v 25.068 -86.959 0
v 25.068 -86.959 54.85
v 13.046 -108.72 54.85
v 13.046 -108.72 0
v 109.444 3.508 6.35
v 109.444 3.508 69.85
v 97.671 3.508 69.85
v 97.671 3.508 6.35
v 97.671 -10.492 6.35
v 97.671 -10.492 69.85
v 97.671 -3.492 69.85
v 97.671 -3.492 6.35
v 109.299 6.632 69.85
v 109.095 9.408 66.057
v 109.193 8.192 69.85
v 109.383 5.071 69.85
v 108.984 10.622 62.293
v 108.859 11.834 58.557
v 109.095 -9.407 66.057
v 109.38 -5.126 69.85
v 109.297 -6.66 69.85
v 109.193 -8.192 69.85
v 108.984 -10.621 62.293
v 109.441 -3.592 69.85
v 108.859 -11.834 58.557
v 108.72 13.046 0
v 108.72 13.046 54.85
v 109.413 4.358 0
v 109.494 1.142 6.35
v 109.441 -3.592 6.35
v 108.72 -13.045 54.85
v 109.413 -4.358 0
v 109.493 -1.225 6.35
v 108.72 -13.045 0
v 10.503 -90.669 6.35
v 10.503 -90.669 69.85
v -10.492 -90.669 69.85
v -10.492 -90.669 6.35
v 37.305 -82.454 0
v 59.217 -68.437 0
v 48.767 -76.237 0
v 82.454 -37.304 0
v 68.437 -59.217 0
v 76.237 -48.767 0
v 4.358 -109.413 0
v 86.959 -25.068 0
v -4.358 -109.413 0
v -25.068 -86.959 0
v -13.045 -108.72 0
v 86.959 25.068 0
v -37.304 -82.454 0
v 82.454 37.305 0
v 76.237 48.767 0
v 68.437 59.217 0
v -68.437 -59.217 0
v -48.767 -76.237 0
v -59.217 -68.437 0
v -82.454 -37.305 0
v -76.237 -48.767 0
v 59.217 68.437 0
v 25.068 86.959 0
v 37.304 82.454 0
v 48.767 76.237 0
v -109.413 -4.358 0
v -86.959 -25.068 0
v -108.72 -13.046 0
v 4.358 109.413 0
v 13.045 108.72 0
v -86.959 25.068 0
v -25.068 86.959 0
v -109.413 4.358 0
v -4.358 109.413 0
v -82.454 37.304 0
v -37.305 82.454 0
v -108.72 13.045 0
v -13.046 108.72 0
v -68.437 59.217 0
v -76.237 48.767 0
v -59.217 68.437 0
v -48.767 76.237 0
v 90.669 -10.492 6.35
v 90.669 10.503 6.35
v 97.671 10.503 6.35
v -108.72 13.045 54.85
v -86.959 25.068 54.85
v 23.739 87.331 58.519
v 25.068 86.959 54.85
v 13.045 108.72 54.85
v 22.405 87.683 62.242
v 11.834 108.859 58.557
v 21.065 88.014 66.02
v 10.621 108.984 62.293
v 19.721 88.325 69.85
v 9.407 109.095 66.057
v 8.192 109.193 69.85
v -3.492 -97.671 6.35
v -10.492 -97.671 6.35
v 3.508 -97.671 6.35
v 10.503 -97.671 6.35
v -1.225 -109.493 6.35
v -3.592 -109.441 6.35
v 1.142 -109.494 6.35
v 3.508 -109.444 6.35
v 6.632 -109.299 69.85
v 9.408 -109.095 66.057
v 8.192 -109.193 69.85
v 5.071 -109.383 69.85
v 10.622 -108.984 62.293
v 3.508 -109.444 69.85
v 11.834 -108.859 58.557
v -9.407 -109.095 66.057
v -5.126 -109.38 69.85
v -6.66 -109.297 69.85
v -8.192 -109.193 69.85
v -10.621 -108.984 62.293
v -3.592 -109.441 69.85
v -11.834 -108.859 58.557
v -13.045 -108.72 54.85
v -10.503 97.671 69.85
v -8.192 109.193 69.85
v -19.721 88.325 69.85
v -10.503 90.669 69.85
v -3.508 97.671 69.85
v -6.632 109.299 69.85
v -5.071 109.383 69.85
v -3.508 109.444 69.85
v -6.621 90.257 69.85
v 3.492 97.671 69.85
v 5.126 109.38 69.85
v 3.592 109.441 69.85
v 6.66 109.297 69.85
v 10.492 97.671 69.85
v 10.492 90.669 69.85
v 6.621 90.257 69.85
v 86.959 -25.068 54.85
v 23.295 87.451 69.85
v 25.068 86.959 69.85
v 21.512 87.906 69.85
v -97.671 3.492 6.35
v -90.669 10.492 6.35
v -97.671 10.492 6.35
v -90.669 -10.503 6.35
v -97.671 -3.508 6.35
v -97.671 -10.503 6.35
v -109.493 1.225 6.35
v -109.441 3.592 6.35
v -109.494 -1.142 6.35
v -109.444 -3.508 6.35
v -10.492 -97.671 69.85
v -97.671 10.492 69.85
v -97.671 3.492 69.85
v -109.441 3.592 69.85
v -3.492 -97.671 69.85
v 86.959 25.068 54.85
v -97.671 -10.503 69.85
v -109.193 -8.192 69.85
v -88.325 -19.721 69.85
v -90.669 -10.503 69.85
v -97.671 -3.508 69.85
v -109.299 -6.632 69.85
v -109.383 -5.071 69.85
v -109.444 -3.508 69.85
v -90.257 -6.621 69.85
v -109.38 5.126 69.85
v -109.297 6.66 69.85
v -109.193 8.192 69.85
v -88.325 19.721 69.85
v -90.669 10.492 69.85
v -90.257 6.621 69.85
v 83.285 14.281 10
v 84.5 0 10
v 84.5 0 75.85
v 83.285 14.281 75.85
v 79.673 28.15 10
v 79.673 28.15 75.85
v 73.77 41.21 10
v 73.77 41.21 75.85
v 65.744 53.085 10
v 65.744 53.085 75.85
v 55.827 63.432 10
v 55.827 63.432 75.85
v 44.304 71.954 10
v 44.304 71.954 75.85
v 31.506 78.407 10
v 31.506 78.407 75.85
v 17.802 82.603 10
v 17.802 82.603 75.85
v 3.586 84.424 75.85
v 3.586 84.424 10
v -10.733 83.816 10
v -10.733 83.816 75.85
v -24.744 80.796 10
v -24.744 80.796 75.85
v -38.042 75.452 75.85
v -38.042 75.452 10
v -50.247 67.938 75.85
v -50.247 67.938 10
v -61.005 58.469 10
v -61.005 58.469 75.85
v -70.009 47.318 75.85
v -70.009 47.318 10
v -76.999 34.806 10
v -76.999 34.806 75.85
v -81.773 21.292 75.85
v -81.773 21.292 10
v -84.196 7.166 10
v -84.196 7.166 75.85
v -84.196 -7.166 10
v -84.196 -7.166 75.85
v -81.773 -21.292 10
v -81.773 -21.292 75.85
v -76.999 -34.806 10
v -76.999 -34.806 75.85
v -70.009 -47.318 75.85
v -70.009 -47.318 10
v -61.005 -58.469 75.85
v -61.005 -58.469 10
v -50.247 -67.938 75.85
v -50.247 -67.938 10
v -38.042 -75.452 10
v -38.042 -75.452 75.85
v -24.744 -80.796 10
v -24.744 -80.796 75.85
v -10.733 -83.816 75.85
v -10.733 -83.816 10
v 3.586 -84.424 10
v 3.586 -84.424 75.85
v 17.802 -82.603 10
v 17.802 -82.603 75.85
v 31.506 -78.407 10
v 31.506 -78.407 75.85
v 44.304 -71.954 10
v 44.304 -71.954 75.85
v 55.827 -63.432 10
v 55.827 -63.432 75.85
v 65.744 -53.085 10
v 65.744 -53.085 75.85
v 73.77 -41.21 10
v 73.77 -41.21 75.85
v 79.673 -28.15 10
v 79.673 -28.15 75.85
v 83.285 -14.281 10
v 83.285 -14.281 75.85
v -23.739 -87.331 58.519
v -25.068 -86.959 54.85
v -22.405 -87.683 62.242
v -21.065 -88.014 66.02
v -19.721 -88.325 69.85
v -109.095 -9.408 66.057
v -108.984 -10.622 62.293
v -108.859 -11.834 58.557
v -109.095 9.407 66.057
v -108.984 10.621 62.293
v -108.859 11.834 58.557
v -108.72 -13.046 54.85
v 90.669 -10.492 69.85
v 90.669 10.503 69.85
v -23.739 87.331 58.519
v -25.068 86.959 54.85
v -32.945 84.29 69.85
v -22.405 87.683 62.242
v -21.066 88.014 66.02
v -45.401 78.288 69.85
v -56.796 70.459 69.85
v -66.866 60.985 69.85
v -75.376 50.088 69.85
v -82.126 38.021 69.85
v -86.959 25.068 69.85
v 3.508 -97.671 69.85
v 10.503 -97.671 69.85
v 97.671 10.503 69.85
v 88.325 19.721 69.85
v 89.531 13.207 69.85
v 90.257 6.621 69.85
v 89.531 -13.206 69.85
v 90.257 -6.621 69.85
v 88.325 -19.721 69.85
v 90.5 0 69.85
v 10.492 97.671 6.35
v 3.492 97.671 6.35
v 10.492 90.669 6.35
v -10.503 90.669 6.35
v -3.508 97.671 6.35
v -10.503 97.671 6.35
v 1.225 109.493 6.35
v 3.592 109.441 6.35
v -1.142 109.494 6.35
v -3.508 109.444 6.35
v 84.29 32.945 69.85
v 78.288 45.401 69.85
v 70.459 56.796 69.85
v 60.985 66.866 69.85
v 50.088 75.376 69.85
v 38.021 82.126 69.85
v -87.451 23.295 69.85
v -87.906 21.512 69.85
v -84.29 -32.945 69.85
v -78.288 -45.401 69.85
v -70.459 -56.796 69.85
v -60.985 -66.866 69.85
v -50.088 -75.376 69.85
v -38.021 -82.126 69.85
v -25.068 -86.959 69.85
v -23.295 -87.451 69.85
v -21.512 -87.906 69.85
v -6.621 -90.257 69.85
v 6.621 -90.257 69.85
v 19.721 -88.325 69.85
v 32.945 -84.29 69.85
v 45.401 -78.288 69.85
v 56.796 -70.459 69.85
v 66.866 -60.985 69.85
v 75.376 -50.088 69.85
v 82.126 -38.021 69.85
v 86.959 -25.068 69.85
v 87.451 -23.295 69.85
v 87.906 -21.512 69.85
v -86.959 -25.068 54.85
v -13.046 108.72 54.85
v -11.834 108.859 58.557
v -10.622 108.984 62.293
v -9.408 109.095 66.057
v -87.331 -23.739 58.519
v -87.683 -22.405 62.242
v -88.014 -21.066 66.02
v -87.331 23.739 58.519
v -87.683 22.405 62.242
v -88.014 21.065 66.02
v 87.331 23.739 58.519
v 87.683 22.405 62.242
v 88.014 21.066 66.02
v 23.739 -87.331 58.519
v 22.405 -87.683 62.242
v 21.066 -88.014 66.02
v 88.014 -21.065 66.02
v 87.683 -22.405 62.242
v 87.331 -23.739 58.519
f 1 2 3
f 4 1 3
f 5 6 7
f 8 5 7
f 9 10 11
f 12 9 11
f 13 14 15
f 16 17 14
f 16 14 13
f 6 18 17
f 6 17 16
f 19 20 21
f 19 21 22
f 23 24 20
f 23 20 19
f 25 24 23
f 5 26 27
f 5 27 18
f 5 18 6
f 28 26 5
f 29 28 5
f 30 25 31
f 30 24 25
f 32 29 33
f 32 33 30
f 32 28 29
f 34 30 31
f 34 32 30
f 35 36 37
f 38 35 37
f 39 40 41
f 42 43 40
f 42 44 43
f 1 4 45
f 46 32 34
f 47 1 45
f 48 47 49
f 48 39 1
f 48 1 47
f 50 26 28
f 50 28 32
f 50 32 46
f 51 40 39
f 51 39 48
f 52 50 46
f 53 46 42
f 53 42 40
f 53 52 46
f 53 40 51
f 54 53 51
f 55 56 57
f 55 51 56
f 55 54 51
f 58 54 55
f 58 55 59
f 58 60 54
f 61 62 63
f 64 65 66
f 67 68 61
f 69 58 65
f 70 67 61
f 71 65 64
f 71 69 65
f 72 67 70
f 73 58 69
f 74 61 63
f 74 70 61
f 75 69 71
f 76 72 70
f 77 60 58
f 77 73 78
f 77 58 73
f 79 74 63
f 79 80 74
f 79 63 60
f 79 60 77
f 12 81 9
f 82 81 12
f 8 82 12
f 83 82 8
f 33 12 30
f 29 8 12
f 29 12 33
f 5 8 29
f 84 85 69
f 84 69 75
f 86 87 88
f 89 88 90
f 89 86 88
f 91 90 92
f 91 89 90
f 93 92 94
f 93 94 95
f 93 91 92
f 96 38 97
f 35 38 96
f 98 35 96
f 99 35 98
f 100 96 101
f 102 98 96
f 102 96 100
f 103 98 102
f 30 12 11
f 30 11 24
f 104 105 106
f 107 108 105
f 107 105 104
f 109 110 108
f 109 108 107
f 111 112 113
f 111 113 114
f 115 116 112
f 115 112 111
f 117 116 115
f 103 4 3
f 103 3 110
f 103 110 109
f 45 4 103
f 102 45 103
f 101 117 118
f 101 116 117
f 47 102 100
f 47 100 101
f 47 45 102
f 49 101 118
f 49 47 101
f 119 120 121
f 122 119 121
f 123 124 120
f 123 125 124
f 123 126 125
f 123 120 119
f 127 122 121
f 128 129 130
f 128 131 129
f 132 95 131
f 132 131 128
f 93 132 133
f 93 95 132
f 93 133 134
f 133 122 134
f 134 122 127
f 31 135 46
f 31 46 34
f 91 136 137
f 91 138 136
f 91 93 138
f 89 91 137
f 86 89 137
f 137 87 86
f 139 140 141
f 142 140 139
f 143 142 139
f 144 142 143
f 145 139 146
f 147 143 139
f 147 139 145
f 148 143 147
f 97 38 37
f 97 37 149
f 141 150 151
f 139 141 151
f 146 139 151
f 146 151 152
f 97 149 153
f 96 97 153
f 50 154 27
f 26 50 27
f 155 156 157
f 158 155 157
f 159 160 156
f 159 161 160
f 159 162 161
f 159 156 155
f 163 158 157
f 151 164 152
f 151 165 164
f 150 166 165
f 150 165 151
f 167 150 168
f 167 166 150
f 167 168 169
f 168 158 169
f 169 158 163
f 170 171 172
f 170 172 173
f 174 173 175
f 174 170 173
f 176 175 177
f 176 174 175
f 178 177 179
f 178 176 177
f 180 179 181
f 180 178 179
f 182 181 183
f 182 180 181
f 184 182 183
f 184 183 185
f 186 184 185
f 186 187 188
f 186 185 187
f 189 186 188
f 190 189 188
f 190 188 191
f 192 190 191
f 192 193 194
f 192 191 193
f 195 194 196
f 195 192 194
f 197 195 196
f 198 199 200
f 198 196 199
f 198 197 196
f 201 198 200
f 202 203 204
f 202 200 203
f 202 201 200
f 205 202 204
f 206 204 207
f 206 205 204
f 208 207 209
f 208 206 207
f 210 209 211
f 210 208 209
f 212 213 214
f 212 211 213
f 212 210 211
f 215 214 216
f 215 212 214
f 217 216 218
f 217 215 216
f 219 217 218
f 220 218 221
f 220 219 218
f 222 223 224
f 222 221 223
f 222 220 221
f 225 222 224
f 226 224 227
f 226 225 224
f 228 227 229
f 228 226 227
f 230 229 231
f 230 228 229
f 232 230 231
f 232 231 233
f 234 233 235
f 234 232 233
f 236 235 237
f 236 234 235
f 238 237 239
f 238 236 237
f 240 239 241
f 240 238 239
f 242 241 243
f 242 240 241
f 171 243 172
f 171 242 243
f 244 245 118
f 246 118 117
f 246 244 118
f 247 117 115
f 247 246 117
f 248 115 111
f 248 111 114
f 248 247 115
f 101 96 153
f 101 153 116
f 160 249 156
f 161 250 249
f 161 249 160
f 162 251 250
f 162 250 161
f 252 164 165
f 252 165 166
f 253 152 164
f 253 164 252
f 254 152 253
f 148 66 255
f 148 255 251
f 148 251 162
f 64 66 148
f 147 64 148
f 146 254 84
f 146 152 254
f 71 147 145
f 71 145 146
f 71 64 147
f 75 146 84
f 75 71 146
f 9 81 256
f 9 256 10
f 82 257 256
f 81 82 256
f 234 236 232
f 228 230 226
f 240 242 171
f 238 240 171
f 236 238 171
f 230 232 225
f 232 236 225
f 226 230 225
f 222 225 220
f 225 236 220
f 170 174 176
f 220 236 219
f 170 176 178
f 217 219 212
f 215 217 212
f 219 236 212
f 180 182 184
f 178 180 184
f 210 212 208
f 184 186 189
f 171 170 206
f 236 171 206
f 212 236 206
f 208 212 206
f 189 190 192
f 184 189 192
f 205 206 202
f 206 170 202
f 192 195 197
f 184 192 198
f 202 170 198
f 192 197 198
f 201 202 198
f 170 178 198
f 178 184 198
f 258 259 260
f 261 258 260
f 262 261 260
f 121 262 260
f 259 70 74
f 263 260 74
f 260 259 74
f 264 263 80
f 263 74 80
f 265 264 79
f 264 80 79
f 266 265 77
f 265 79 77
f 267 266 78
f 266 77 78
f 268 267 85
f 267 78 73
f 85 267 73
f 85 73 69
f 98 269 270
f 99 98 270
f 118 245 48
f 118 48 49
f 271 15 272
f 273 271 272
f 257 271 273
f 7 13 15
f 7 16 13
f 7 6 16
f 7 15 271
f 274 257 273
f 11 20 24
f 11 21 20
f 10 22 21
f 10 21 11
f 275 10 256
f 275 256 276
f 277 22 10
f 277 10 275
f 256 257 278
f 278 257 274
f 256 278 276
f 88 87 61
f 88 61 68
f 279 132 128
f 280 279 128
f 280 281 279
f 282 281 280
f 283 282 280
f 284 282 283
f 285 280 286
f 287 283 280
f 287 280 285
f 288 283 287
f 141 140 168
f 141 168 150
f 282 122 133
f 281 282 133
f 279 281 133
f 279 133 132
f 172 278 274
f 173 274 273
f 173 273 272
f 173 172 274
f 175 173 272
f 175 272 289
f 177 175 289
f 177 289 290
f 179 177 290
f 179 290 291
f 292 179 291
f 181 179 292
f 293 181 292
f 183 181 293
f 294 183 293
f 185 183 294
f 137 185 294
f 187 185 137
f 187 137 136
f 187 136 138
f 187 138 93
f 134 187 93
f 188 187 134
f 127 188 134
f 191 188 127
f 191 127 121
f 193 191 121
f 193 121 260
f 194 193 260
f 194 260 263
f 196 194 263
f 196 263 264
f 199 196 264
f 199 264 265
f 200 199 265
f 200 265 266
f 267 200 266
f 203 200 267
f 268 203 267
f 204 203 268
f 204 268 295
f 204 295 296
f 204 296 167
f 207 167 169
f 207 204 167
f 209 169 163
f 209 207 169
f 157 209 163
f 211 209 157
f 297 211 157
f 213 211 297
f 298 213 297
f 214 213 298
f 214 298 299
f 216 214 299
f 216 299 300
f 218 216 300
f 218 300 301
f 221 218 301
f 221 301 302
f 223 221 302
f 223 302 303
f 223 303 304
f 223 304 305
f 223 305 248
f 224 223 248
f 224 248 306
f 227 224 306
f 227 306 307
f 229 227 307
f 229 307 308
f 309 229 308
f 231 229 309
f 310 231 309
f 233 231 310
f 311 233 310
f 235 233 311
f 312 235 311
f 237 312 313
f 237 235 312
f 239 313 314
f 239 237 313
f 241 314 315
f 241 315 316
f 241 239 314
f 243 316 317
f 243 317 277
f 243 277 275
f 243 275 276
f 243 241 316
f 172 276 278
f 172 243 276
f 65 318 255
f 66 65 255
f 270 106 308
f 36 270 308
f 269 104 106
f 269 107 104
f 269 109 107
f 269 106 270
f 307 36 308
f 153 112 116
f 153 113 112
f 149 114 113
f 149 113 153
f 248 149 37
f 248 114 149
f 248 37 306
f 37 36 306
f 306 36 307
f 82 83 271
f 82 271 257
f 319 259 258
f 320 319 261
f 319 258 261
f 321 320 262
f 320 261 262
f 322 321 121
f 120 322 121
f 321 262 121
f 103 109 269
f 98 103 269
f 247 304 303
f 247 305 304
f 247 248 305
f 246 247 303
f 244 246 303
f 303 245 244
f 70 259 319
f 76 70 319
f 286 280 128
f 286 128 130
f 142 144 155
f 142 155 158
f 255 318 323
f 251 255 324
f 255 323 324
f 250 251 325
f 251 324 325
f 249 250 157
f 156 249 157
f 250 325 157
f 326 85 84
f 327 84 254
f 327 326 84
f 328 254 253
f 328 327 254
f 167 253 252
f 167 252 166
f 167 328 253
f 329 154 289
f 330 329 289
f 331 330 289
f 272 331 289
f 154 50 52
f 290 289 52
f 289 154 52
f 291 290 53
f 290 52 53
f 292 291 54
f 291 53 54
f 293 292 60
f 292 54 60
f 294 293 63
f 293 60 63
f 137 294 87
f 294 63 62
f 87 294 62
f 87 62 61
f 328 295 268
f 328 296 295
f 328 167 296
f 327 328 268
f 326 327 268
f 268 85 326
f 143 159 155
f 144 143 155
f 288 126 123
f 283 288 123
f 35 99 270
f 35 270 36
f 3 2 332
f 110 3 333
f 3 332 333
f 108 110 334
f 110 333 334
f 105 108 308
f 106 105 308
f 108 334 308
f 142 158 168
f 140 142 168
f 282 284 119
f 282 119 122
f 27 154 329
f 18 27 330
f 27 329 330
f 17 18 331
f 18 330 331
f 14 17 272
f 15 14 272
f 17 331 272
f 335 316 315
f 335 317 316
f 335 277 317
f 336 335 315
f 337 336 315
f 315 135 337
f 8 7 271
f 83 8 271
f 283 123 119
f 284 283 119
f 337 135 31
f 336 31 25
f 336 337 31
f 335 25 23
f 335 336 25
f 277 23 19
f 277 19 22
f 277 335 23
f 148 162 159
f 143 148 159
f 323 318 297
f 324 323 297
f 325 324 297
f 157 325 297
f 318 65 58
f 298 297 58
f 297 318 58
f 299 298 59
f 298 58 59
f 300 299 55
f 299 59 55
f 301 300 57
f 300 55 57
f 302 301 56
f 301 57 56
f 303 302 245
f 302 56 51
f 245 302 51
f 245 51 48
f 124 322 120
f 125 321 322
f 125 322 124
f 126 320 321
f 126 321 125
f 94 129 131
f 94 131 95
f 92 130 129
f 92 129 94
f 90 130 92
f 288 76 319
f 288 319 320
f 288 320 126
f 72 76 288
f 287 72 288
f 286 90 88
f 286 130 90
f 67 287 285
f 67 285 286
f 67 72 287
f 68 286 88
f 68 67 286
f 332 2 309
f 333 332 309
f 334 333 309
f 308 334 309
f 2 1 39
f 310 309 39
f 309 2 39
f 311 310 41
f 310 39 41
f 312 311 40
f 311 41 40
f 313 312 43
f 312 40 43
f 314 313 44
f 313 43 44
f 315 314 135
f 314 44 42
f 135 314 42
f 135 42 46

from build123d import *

# Parameters (mm, degrees)
SKETCH1_R           = 90.5
SKETCH1_R_2         = 84.5
BOSS_EXTRUDE1_DEPTH = 76.35
CHAMFER1_SIZE       = 6.5
WRAP12_SECTION_W    = 19
WRAP12_SECTION_H    = 69.85
WRAP12_ANGLE        = 32.161608832
CUT_EXTRUDE1_DEPTH  = 63.5
CHAMFER2_SIZE       = 19
CHAMFER5_SIZE       = 15
CHAMFER5_SIZE_2     = 4.019237886
CIRPATTERN6_COUNT   = 4
SKETCH15_R          = 84.5
BOSS_EXTRUDE2_DEPTH = 10


with BuildPart() as part:
    # Sketch1 → Boss-Extrude1 (new body)
    with BuildSketch(Plane.XY):
        Circle(SKETCH1_R)
        Circle(SKETCH1_R_2, mode=Mode.SUBTRACT)
    extrude(amount=BOSS_EXTRUDE1_DEPTH)

    # Chamfer1
    # the kernel refuses this chamfer: 6.5 mm, written as the material it takes off along each edge
    with BuildSketch(Plane(origin=(0, 0, 76.35), x_dir=(1, 0, 0), z_dir=(0, -1, 0))) as chamfer1_piece_1:
        Polygon((90.5, -CHAMFER1_SIZE), (90.5 - CHAMFER1_SIZE, 0), (90.5, 0), align=None)
    revolve(axis=Axis((0, 0, 76.35), (0, 0, 1)), mode=Mode.SUBTRACT)

    # Wrap12 section (on wrap section) → Wrap12 (revolve)
    with BuildSketch(Plane(origin=(0, 0, 0), x_dir=(0.9608717281441653, 0.276993722046629, 0), z_dir=(-0.276993722046629, 0.9608717281441653, 0))):
        with Locations((100, -34.925)):
            Rectangle(WRAP12_SECTION_W, WRAP12_SECTION_H)
    revolve(axis=Axis((0, 0, 0), (0, 0, -1)), revolution_arc=WRAP12_ANGLE)

    # Sketch12 → Cut-Extrude1 (cut)
    with BuildSketch(Plane.XY.offset(69.85)):
        Polygon((122.706651928, -0.201195148), (122.706651928, 3.507927311), (97.67138598, 3.507927311), (97.67138598, 10.503148948), (90.66864355, 10.503148948), (90.66864355, -10.492123054), (97.67138598, -10.492123054), (97.67138598, -3.492123054), (122.706651928, -3.70406248), align=None)
    extrude(amount=-CUT_EXTRUDE1_DEPTH, mode=Mode.SUBTRACT)

    # Chamfer2
    # the kernel refuses this chamfer: 19 mm, written as the material it takes off along each edge
    with BuildSketch(Plane(origin=(105.215515497, -30.330600038, 118.711976771), x_dir=(-0.9608722876451651, 0.27699178116967144, 0), z_dir=(0, 0, -1))) as chamfer2_piece_1_section:
        with BuildLine():
            Line((CHAMFER2_SIZE, 0), (1.420369251, 17.579630749))
            ThreePointArc((1.420369251, 17.579630749), (0.375784571, 9.063973019), (0, 0))
            Line((0, 0), (CHAMFER2_SIZE, 0))
        make_face()
    chamfer2_piece_1 = extrude(amount=167.573953543, mode=Mode.PRIVATE)
    chamfer2_piece_1 = chamfer2_piece_1 - Plane(origin=(0, 0, 118.711976771), x_dir=(1, 0, 0), z_dir=(0, 0, -1)) * Cylinder(90.5, 412, mode=Mode.PRIVATE)
    add(chamfer2_piece_1, mode=Mode.SUBTRACT)
    with BuildSketch(Plane(origin=(105.215454232, 30.330812564, 118.711976771), x_dir=(-0.9608717281441654, -0.2769937220466291, 0), z_dir=(0, 0, -1))) as chamfer2_piece_2_section:
        with BuildLine():
            Line((CHAMFER2_SIZE, 0), (1.420369251, -17.579630749))
            ThreePointArc((1.420369251, -17.579630749), (0.375784571, -9.063973019), (0, 0))
            Line((0, 0), (CHAMFER2_SIZE, 0))
        make_face()
    chamfer2_piece_2 = extrude(amount=167.573953543, mode=Mode.PRIVATE)
    chamfer2_piece_2 = chamfer2_piece_2 - Plane(origin=(0, 0, 118.711976771), x_dir=(1, 0, 0), z_dir=(0, 0, -1)) * Cylinder(90.5, 412, mode=Mode.PRIVATE)
    add(chamfer2_piece_2, mode=Mode.SUBTRACT)

    # Chamfer5
    # the kernel refuses this chamfer: 15, 4.019237886 mm, written as the material it takes off along each edge
    with BuildSketch(Plane(origin=(52.865116584, 43.903567605, 69.85), x_dir=(0, 0, -1), z_dir=(0.8753030540266438, -0.483574775615551, 0))) as chamfer5_piece_1_section:
        Polygon((CHAMFER5_SIZE, 0), (0, -CHAMFER5_SIZE_2), (0, 0), align=None)
    chamfer5_piece_1 = extrude(amount=102.762999332, mode=Mode.PRIVATE)
    chamfer5_piece_1 = chamfer5_piece_1 - Plane(origin=(0, 0, 69.85), x_dir=(1, 0, 0), z_dir=(0, 0, -1)) * Cylinder(90.5, 266, mode=Mode.PRIVATE)
    add(chamfer5_piece_1, mode=Mode.SUBTRACT)
    with BuildSketch(Plane(origin=(52.865205265, -43.903460822, 69.85), x_dir=(0, 0, -1), z_dir=(0.8753020772463168, 0.48357654364979585, 0))) as chamfer5_piece_2_section:
        Polygon((CHAMFER5_SIZE, 0), (0, CHAMFER5_SIZE_2), (0, 0), align=None)
    chamfer5_piece_2 = extrude(amount=102.762999332, mode=Mode.PRIVATE)
    chamfer5_piece_2 = chamfer5_piece_2 - Plane(origin=(0, 0, 69.85), x_dir=(1, 0, 0), z_dir=(0, 0, -1)) * Cylinder(90.5, 266, mode=Mode.PRIVATE)
    add(chamfer5_piece_2, mode=Mode.SUBTRACT)


with BuildPart() as cirpattern6_1:
    # CirPattern6: pattern copy
    add(part.part.rotate(Axis((0, 0, 0), (0, 0, 1)), 1 * 360 / CIRPATTERN6_COUNT))


with BuildPart() as cirpattern6_2:
    # CirPattern6: pattern copy
    add(part.part.rotate(Axis((0, 0, 0), (0, 0, 1)), 2 * 360 / CIRPATTERN6_COUNT))


with BuildPart() as cirpattern6_3:
    # CirPattern6: pattern copy
    add(part.part.rotate(Axis((0, 0, 0), (0, 0, 1)), 3 * 360 / CIRPATTERN6_COUNT))


with BuildPart() as part_1:
    add(part.part)

    add(cirpattern6_1.part)  # Boss-Extrude2 merges CirPattern6_1

    add(cirpattern6_2.part)  # Boss-Extrude2 merges CirPattern6_2

    add(cirpattern6_3.part)  # Boss-Extrude2 merges CirPattern6_3
    # Sketch15 → Boss-Extrude2 (add)
    with BuildSketch(Plane(origin=(0, 0, 0), x_dir=(-1, 0, 0), z_dir=(0, 0, -1))):
        Circle(SKETCH15_R)
    extrude(amount=-BOSS_EXTRUDE2_DEPTH)


solid = part_1.part
